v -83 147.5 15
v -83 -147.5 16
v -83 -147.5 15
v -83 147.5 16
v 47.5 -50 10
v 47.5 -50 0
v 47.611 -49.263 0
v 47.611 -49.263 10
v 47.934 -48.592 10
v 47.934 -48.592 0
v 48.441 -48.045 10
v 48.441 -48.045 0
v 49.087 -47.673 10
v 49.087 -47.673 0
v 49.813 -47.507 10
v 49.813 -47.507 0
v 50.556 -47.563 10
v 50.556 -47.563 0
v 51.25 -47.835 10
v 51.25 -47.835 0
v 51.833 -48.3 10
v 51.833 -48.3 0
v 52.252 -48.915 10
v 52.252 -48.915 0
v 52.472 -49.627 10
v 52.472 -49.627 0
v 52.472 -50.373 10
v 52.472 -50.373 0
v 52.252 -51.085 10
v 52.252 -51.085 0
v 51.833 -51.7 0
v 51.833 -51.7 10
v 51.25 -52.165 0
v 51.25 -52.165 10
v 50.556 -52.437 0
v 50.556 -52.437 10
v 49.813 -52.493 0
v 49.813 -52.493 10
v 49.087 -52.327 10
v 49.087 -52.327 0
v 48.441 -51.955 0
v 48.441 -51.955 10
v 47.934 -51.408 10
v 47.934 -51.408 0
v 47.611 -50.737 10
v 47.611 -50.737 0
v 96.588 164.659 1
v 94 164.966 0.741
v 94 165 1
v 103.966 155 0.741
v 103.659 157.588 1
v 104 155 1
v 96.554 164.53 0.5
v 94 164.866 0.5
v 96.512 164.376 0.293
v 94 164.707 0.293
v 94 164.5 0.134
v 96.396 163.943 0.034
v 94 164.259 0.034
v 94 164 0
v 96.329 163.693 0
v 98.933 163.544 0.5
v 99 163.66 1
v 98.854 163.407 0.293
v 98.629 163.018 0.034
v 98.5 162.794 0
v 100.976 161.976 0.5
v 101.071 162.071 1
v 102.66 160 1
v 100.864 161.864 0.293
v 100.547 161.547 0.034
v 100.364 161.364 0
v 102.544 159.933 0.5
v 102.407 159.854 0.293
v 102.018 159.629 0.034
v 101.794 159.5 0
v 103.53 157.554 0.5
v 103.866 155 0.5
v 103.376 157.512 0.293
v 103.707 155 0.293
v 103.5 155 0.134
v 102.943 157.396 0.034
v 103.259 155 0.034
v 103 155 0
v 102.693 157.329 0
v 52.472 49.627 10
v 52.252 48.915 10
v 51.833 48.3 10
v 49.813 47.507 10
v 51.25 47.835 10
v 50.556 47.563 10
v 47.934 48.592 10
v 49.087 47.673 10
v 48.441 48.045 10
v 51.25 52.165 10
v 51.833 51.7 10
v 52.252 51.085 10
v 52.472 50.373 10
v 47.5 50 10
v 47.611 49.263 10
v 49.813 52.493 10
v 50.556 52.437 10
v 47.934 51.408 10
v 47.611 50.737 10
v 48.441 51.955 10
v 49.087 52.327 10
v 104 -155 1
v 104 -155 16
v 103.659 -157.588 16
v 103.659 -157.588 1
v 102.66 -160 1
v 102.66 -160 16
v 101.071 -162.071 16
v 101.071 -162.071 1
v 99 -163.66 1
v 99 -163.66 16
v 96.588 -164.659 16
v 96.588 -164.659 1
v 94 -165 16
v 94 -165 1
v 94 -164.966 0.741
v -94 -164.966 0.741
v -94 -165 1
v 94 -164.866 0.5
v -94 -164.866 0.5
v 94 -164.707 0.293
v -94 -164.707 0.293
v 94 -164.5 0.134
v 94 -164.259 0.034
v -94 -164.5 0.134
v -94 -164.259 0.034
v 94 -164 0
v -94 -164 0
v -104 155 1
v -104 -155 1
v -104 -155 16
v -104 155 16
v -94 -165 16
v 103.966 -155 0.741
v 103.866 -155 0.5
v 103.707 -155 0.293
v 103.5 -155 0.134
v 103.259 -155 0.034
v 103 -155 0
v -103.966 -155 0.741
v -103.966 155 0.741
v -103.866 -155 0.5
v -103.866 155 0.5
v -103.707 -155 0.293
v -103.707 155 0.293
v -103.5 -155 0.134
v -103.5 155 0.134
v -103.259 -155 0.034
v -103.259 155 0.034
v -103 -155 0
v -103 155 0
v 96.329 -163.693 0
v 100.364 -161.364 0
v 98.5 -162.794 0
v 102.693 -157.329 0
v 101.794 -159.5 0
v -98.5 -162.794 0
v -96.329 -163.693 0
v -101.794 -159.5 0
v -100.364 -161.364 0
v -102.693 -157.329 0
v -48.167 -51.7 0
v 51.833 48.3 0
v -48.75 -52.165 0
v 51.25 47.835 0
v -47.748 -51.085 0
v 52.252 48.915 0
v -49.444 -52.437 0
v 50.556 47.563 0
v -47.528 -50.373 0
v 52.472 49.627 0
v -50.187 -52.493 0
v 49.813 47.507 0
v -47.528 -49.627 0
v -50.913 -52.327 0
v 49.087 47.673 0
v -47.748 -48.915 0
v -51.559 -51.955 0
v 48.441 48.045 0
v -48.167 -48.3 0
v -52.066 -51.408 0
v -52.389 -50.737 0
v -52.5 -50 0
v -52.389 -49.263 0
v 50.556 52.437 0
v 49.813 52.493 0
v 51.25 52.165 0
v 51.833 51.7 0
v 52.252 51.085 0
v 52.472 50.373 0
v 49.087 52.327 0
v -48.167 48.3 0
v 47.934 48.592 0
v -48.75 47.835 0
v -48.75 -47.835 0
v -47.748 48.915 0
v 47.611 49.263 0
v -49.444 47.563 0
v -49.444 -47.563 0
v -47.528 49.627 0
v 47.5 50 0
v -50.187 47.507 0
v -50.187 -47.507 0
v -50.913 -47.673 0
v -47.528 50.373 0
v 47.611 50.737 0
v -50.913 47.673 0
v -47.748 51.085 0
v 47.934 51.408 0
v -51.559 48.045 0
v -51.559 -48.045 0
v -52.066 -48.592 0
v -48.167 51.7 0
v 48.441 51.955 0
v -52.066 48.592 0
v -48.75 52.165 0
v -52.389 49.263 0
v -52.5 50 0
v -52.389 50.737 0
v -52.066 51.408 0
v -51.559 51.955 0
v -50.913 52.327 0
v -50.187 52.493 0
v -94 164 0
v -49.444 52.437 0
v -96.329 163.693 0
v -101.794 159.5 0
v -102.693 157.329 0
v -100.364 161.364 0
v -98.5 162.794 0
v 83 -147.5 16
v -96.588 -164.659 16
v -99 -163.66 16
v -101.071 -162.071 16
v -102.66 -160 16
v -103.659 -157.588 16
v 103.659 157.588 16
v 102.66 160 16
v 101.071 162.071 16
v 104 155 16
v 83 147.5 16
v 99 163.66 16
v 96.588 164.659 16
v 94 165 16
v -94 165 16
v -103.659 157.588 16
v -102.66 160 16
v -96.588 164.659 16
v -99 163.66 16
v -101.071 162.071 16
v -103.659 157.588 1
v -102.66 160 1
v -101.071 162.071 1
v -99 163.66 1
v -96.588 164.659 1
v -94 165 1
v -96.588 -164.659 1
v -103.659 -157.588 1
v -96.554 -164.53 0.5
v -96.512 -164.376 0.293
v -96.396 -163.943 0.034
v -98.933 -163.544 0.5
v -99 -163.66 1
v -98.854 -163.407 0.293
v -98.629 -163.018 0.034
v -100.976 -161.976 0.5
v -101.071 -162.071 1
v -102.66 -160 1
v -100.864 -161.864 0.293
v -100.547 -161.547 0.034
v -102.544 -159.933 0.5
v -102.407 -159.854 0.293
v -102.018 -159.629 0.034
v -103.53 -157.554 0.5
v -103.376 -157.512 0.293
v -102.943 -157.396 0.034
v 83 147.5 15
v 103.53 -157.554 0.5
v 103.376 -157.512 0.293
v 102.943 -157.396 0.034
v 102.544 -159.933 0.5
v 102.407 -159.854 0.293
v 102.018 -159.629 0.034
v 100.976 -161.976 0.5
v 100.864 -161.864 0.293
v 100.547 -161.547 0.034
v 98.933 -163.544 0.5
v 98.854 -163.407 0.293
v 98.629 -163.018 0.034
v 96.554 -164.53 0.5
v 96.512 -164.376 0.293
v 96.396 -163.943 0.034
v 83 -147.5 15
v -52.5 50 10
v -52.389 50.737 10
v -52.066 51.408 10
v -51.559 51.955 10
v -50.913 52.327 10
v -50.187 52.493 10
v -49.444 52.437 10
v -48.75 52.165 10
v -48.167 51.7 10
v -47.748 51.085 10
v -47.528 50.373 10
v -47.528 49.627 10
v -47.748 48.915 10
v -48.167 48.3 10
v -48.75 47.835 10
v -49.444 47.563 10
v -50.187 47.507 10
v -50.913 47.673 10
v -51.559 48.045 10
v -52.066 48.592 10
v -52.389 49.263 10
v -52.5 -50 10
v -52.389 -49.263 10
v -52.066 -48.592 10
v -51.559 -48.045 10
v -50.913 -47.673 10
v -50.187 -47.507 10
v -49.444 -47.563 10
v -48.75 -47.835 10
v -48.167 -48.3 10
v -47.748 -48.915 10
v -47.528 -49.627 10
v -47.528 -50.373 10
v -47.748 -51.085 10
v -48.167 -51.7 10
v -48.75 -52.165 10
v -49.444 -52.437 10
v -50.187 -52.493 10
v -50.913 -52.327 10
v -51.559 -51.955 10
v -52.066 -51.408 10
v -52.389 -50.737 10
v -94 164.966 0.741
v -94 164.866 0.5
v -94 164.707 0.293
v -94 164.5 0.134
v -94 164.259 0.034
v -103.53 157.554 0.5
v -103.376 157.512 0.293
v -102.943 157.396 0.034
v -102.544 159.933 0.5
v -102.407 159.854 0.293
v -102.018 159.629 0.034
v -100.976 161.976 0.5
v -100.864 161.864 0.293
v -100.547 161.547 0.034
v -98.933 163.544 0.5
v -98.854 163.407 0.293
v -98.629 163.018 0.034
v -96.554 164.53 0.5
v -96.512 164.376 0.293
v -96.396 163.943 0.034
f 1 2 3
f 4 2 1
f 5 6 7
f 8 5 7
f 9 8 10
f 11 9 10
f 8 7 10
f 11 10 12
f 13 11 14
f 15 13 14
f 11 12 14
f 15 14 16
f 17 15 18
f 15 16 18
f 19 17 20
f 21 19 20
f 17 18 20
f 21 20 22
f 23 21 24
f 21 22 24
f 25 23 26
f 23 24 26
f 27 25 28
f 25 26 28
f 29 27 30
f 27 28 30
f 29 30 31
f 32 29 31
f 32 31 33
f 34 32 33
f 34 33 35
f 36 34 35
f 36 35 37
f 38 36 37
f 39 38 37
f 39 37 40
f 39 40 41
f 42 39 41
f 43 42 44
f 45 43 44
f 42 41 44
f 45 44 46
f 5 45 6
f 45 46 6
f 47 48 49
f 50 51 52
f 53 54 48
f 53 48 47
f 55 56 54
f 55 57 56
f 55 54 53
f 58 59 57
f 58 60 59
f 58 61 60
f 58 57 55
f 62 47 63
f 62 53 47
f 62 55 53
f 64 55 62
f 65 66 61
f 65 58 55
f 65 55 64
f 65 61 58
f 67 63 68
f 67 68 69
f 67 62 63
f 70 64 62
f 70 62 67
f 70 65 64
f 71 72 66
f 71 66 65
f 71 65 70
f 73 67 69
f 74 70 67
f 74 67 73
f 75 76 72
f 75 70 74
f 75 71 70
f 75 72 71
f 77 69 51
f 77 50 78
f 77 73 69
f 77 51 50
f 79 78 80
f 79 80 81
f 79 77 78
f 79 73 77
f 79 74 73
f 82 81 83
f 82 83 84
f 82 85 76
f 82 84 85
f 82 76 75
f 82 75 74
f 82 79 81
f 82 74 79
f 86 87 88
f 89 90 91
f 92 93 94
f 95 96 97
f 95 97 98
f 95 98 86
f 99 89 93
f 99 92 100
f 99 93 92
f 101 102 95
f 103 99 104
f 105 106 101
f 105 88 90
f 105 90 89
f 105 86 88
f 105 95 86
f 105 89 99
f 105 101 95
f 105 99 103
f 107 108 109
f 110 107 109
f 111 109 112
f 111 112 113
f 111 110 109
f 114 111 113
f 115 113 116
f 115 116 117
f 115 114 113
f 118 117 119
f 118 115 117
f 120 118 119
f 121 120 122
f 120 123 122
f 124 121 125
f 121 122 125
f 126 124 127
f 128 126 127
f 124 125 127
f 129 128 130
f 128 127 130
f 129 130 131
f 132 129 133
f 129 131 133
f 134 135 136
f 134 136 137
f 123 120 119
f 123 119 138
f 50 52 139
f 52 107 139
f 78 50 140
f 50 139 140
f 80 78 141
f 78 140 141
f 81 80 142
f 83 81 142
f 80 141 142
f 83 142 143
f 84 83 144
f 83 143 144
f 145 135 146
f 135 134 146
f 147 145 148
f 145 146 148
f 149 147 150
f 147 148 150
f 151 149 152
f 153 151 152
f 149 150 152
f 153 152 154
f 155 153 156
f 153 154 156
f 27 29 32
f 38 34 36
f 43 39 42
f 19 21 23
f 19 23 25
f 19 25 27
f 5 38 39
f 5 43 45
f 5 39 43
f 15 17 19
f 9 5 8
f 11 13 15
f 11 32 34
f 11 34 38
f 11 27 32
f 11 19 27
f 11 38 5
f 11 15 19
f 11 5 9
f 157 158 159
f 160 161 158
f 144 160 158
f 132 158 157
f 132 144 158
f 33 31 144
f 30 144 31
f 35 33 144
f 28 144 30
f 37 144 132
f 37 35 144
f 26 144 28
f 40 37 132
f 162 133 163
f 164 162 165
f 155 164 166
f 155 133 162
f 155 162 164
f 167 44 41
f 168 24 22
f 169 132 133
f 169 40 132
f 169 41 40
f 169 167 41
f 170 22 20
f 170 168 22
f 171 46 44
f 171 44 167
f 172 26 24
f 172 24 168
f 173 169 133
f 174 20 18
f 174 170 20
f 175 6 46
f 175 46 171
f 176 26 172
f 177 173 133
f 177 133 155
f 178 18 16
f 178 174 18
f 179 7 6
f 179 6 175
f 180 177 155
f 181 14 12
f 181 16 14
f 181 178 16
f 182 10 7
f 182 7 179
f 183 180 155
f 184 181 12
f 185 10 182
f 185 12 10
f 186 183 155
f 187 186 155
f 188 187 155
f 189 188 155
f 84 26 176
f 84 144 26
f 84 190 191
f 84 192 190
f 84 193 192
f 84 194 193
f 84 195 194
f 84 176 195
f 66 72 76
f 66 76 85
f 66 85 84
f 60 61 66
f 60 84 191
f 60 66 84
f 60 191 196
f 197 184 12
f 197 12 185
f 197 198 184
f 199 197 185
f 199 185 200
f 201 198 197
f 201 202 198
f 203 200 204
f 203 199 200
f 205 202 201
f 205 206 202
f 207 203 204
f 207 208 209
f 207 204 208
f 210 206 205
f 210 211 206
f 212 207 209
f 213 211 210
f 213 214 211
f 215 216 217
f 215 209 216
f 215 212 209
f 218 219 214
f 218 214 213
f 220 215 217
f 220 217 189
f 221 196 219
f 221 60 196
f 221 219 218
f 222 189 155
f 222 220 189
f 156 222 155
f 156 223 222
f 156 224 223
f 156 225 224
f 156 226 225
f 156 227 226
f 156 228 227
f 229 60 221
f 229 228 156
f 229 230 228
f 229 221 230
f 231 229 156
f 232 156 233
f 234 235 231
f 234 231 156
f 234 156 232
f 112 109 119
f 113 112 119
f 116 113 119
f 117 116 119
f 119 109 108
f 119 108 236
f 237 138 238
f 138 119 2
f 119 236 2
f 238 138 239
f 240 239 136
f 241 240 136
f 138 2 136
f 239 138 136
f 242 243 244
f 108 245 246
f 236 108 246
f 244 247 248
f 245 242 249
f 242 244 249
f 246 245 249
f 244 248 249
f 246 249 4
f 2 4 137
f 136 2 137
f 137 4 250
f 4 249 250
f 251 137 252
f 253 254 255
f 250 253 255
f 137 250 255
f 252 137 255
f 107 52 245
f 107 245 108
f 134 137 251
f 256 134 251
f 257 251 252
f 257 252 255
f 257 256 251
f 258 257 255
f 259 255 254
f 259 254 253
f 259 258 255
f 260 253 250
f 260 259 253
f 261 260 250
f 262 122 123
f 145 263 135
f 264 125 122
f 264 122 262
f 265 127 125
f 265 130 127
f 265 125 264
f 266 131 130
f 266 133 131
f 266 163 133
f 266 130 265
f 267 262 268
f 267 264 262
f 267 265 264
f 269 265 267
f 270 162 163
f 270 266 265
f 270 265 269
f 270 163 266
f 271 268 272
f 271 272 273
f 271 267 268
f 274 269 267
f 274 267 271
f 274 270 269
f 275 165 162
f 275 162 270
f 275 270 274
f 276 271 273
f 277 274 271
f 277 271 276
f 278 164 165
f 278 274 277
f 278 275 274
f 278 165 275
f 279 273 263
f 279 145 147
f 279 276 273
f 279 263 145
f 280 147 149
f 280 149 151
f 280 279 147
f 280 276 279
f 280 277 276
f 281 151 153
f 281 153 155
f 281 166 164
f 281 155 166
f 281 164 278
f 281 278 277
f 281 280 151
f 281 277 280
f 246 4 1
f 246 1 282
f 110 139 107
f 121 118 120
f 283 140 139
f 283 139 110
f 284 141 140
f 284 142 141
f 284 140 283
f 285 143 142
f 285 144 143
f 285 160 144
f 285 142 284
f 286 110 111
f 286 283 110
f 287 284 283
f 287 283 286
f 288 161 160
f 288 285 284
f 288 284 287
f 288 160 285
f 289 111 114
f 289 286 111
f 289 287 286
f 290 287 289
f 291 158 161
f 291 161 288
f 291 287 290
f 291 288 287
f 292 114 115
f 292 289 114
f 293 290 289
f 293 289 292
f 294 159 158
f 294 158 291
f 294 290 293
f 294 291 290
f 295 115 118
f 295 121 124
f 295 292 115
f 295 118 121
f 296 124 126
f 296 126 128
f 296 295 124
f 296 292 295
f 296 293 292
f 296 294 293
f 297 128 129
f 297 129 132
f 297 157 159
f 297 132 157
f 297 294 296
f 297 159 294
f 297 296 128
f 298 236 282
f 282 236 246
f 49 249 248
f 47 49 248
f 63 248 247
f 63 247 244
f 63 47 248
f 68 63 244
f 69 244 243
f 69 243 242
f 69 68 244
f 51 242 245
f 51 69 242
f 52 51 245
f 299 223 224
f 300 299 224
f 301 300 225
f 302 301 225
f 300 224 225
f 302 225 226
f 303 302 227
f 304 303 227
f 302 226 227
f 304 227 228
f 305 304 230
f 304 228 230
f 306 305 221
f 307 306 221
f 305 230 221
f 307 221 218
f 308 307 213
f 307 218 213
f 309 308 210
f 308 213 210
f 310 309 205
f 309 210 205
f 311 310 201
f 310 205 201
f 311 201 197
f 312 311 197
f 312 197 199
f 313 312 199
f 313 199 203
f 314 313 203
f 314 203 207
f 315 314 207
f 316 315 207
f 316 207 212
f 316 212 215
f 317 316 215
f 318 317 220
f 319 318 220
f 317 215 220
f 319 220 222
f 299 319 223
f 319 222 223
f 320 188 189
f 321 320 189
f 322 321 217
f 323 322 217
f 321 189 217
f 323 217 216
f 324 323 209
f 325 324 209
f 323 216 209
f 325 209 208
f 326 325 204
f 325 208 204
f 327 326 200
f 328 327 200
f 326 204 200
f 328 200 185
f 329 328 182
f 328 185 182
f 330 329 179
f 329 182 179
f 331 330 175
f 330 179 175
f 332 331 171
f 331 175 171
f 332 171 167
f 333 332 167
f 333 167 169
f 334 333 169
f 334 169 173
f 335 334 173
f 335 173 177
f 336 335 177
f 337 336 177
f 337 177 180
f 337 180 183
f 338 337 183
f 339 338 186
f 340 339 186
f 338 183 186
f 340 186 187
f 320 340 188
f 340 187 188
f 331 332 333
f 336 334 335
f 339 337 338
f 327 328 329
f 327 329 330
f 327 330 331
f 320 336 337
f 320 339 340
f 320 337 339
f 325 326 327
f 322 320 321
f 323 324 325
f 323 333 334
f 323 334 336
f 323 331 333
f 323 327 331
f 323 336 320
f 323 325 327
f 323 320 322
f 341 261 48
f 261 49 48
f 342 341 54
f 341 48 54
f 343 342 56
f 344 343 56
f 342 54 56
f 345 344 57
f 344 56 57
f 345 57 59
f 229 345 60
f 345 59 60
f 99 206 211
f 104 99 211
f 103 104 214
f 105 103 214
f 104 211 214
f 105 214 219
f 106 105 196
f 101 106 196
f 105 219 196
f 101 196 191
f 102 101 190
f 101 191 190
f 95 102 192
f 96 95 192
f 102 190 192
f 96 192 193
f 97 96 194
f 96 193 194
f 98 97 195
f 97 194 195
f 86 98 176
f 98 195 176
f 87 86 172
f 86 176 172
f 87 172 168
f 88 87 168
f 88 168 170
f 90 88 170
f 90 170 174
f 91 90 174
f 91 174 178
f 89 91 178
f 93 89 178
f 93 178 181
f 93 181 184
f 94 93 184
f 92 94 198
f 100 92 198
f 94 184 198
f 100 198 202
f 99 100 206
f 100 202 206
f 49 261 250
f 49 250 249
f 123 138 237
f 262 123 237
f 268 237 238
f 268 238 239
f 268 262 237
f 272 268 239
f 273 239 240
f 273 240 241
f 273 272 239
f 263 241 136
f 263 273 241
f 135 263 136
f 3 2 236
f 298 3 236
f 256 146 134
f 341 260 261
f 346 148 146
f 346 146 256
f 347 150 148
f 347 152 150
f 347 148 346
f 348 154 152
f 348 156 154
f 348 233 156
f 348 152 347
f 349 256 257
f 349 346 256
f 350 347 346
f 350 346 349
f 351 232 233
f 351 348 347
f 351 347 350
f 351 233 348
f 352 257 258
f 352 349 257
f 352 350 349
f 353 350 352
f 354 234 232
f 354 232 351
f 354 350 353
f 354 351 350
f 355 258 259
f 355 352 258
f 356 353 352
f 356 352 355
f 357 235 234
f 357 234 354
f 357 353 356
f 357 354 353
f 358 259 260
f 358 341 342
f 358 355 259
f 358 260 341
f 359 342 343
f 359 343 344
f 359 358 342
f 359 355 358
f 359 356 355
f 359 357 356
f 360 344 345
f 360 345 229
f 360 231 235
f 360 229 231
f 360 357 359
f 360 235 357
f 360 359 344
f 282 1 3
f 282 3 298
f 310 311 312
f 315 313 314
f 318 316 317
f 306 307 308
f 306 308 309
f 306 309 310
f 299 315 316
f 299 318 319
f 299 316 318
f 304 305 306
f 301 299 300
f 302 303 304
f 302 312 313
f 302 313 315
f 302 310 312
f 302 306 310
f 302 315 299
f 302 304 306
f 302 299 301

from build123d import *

# Parameters (mm, degrees)
BOSS_EXTRUDE1_DEPTH = 16
FILLET2_R           = 1
SKETCH2_W           = 166
SKETCH2_H           = 295
CUT_EXTRUDE1_DEPTH  = 1
SKETCH3_R           = 2.5
CUT_EXTRUDE2_DEPTH  = 10


with BuildPart() as part:
    # Sketch1 → Boss-Extrude1 (new body)
    with BuildSketch(Plane.XY):
        with BuildLine():
            Line((-94, 165), (94, 165))
            ThreePointArc((94, 165), (101.071067812, 162.071067812), (104, 155))
            Line((104, 155), (104, -155))
            ThreePointArc((104, -155), (101.071067812, -162.071067812), (94, -165))
            Line((94, -165), (-94, -165))
            ThreePointArc((-94, -165), (-101.071067812, -162.071067812), (-104, -155))
            Line((-104, -155), (-104, 155))
            ThreePointArc((-104, 155), (-101.071067812, 162.071067812), (-94, 165))
        make_face()
    extrude(amount=BOSS_EXTRUDE1_DEPTH)

    # Fillet2
    fillet2_edges = [part.edges().sort_by_distance(p)[0] for p in [
        (0, 165, 0),
        (101.071067812, 162.071067812, 0),
        (104, 0, 0),
        (101.071067812, -162.071067812, 0),
        (0, -165, 0),
        (-101.071067812, -162.071067812, 0),
        (-104, 0, 0),
        (-101.071067812, 162.071067812, 0),
    ]]
    fillet(fillet2_edges, radius=FILLET2_R)

    # Sketch2 → Cut-Extrude1 (cut)
    with BuildSketch(Plane.XY.offset(16)):
        Rectangle(SKETCH2_W, SKETCH2_H)
    extrude(amount=-CUT_EXTRUDE1_DEPTH, mode=Mode.SUBTRACT)

    # Sketch3 → Cut-Extrude2 (cut)
    with BuildSketch(Plane(origin=(0, 0, 0), x_dir=(-1, 0, 0), z_dir=(0, 0, -1))):
        with Locations((-50, 50)):
            Circle(SKETCH3_R)
        with Locations((50, 50)):
            Circle(SKETCH3_R)
        with Locations((50, -50)):
            Circle(SKETCH3_R)
        with Locations((-50, -50)):
            Circle(SKETCH3_R)
    extrude(amount=-CUT_EXTRUDE2_DEPTH, mode=Mode.SUBTRACT)


solid = part.part
